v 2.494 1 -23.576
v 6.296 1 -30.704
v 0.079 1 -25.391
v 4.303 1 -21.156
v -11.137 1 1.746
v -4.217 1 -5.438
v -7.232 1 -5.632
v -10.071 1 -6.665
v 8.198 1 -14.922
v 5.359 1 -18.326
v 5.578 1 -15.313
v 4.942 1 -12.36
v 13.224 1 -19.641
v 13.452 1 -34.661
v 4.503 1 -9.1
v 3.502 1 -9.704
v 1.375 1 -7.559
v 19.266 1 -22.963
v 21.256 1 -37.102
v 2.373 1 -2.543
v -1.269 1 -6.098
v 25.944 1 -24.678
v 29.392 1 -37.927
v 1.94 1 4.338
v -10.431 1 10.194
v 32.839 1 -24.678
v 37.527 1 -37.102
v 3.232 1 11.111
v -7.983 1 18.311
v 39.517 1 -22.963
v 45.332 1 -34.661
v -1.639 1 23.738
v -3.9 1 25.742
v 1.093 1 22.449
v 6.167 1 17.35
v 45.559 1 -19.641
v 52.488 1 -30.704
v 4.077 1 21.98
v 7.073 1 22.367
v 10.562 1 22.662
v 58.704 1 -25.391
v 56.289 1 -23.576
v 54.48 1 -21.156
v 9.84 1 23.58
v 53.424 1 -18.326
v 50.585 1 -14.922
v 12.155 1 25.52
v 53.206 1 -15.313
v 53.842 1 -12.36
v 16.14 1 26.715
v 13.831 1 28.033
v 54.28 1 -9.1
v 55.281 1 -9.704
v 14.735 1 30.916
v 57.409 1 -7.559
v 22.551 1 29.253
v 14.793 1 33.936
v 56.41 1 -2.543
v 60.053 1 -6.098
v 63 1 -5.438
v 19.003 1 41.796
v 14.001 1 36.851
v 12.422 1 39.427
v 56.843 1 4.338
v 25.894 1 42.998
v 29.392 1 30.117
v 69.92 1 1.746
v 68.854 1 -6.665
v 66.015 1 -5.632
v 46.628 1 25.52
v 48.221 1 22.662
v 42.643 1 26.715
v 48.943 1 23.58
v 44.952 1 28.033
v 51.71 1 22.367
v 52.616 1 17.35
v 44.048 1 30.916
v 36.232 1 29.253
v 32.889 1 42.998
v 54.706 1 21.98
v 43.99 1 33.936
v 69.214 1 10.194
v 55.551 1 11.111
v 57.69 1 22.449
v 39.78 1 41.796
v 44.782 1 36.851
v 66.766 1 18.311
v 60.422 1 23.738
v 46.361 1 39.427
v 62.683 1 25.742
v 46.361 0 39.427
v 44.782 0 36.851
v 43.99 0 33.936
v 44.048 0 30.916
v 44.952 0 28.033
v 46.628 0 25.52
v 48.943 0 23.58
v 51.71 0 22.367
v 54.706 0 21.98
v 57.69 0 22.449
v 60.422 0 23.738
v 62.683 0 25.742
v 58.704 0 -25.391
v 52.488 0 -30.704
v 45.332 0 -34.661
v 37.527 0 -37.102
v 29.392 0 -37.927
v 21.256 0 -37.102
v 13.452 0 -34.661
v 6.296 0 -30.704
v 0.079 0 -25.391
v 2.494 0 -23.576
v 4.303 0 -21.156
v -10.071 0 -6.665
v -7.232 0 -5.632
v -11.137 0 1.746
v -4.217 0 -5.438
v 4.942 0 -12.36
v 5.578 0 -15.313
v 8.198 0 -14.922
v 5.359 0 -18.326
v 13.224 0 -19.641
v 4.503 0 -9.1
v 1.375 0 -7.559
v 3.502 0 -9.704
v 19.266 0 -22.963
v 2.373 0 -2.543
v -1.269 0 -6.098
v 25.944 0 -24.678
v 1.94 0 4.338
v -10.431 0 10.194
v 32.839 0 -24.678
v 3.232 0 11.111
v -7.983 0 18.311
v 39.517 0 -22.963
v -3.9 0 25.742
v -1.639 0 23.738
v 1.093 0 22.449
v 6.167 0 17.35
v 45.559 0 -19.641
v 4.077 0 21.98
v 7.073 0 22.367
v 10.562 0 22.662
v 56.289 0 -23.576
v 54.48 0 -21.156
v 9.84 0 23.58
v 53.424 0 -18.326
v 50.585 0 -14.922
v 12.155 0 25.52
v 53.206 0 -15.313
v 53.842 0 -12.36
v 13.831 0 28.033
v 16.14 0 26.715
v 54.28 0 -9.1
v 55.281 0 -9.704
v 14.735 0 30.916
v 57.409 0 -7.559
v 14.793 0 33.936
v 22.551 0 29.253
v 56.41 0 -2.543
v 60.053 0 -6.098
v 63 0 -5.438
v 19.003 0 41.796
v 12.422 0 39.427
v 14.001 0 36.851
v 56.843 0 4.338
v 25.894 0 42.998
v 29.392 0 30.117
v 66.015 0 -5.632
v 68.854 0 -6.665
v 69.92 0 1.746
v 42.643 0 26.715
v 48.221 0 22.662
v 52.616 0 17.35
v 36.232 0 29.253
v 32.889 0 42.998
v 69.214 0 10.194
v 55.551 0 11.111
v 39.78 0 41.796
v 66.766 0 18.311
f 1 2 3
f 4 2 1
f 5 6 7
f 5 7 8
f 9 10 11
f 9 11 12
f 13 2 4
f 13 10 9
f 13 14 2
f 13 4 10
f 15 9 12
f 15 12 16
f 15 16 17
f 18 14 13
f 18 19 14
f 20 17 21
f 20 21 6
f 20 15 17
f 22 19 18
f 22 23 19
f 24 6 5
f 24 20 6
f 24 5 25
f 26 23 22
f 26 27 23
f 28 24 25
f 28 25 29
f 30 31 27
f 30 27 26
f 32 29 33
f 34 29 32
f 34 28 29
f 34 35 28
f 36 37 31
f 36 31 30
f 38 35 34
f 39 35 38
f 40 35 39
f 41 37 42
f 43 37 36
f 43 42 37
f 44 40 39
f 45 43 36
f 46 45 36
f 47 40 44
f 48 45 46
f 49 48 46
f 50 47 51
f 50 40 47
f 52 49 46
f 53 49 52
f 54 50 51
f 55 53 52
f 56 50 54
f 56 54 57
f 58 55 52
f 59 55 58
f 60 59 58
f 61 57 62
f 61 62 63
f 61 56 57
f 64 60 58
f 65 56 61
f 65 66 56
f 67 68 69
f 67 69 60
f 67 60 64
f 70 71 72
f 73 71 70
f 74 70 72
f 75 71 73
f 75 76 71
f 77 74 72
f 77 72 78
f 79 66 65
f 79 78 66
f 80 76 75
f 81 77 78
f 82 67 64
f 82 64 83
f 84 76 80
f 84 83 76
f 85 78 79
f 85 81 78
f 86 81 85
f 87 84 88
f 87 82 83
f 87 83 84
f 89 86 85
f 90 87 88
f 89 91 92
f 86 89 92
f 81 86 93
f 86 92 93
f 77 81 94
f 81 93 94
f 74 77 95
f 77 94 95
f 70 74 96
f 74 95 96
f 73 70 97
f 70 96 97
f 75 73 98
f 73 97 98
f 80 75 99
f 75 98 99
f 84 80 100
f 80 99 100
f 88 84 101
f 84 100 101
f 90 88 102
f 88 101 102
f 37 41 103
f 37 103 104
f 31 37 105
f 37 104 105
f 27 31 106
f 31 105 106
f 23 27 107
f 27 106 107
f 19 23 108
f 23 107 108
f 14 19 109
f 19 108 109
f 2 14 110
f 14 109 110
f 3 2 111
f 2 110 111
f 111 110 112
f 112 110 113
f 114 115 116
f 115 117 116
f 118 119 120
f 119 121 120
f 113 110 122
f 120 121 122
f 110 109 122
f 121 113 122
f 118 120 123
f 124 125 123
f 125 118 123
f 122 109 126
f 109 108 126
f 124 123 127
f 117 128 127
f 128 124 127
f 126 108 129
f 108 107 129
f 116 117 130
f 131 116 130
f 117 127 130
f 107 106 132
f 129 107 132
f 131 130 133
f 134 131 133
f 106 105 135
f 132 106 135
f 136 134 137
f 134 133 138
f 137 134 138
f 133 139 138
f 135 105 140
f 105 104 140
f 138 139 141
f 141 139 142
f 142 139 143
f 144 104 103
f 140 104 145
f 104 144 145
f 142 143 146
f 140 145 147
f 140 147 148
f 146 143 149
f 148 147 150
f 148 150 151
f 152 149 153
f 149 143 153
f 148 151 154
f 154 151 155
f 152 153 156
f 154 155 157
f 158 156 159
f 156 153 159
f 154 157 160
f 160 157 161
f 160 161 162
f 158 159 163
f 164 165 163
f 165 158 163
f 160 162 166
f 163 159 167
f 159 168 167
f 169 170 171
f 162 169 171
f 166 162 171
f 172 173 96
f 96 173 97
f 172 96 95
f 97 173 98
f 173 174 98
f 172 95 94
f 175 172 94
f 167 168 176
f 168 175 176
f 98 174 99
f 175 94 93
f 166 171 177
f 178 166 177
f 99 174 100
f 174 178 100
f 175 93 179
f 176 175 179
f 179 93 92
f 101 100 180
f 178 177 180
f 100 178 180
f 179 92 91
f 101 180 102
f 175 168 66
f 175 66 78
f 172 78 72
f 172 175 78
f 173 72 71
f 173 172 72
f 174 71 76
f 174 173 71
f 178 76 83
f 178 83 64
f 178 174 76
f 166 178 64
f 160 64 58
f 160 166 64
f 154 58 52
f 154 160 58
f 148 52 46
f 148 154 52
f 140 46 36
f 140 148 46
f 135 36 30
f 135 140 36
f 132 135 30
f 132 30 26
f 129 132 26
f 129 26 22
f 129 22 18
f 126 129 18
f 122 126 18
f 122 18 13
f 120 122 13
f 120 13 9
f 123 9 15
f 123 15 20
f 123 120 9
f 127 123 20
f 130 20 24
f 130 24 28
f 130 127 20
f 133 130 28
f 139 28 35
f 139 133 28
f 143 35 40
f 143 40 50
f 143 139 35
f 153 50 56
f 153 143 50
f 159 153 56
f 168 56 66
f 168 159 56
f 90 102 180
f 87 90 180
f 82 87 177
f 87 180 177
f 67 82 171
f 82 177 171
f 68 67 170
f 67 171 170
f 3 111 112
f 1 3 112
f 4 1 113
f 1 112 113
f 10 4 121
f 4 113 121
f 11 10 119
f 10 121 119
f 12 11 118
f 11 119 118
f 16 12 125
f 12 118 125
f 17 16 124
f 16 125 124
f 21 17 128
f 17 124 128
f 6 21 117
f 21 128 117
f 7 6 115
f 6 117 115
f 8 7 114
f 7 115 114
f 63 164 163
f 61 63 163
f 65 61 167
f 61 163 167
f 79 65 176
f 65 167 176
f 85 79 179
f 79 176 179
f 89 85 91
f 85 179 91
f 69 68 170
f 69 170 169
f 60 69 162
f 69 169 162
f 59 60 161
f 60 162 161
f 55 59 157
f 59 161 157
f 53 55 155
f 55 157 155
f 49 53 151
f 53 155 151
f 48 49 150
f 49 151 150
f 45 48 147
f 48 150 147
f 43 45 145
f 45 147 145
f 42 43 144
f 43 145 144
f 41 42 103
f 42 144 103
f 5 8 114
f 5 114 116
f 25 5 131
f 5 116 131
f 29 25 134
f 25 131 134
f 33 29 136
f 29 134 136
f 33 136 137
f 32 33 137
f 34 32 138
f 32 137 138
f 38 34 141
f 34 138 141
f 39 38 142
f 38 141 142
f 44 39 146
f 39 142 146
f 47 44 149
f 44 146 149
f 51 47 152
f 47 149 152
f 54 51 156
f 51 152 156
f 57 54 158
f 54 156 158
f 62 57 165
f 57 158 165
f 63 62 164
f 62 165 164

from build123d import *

# Parameters (mm, degrees)
SKETCH1_R           = 40.538
SKETCH1_R_2         = 27.506
BOSS_EXTRUDE1_DEPTH = 1
SKETCH4_R           = 10.65
CUT_EXTRUDE1_DEPTH  = 1


with BuildPart() as part:
    # Sketch1 → Boss-Extrude1 (new body)
    with BuildSketch(Plane(origin=(0, 0, 0), x_dir=(-1, 0, 0), z_dir=(0, 1, 0))):
        with Locations(Location((-29.391570254, 2.611368154, 0), (0, 0, 90))):
            Circle(SKETCH1_R)
        with Locations(Location((-29.391570254, 2.611368154, 0), (0, 0, 90))):
            Circle(SKETCH1_R_2, mode=Mode.SUBTRACT)
    extrude(amount=BOSS_EXTRUDE1_DEPTH)

    # Sketch4 → Cut-Extrude1 (cut)
    with BuildSketch(Plane.XZ):
        with Locations((4.223815401, 32.628524909)):
            Circle(SKETCH4_R)
        with Locations((54.559325107, 32.628524909)):
            Circle(SKETCH4_R)
        with Locations((63.829694025, -16.055747722)):
            Circle(SKETCH4_R)
        with Locations((-5.046553517, -16.055747722)):
            Circle(SKETCH4_R)
    extrude(amount=-CUT_EXTRUDE1_DEPTH, mode=Mode.SUBTRACT)


solid = part.part
